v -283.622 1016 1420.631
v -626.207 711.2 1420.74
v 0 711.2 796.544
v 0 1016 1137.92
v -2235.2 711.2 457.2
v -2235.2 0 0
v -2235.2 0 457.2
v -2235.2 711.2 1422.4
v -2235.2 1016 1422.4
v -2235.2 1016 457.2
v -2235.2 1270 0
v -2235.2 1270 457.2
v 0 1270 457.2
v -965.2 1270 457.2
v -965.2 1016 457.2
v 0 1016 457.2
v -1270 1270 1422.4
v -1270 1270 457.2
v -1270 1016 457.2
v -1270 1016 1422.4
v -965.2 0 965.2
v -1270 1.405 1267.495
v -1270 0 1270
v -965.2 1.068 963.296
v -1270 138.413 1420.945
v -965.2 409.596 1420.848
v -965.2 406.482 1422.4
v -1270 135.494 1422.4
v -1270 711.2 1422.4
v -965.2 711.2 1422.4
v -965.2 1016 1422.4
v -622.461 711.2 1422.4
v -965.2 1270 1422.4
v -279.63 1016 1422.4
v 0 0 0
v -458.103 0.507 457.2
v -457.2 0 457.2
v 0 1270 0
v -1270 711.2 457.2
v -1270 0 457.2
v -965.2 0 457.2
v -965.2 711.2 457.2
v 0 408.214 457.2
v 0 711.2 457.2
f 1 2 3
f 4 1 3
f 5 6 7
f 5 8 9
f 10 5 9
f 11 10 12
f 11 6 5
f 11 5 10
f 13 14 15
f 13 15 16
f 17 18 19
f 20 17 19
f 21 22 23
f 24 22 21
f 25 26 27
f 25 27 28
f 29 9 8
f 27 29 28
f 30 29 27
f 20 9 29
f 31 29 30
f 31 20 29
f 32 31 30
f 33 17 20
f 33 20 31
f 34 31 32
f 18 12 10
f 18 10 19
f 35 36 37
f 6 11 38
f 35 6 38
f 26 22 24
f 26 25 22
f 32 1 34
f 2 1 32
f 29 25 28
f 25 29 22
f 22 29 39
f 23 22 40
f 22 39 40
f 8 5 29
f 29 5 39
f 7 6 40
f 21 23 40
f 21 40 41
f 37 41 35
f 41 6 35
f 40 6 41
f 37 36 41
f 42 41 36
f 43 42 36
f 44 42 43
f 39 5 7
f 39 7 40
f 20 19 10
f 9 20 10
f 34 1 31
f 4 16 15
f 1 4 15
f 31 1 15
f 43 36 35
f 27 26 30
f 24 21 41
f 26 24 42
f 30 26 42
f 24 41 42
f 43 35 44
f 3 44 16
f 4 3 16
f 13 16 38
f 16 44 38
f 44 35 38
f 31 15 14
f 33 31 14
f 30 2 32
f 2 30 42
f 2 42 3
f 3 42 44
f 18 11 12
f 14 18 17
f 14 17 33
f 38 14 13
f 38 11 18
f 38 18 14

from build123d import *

# Parameters (mm, degrees)
F1_DEPTH = 1422.4
F0_W     = 965.2
F0_H     = 254
F0_H_2   = 711.2
F2_DEPTH = 457.2
F8_DEPTH = 508


with BuildPart() as f1:
    # F0 (on Top) → F1 (new body)
    with BuildSketch(Plane.XY):
        Polygon((-1270, 0), (-965.2, 0), (-965.2, 711.2), (0, 711.2), (0, 1016), (-965.2, 1016), (-965.2, 1270), (-1270, 1270), (-1270, 1016), (-2235.2, 1016), (-2235.2, 711.2), (-1270, 711.2), align=None)
    extrude(amount=F1_DEPTH)

    # F0 (on Top) → F2 (join)
    with BuildSketch(Plane.XY):
        with Locations((-1752.6, 1143)):
            Rectangle(F0_W, F0_H)
        with Locations((-482.6, 1143)):
            Rectangle(F0_W, F0_H)
        with Locations((-1752.6, 355.6)):
            Rectangle(F0_W, F0_H_2)
        with Locations((-482.6, 355.6)):
            Rectangle(F0_W, F0_H_2)
    extrude(amount=F2_DEPTH)

    # F7 (on 3pt) → F8 (cut)
    with BuildSketch(Plane(origin=(0, 0, 0), x_dir=(0.8331213628, 0.4125708276, -0.3683668104), z_dir=(0.553090223, -0.6214566012, 0.5548719654))):
        Polygon((0, 0), (0, 1904.3694734573), (-1708.9967775732, 1061.0217298967), align=None)
    extrude(amount=F8_DEPTH, mode=Mode.SUBTRACT)


solid = f1.part
